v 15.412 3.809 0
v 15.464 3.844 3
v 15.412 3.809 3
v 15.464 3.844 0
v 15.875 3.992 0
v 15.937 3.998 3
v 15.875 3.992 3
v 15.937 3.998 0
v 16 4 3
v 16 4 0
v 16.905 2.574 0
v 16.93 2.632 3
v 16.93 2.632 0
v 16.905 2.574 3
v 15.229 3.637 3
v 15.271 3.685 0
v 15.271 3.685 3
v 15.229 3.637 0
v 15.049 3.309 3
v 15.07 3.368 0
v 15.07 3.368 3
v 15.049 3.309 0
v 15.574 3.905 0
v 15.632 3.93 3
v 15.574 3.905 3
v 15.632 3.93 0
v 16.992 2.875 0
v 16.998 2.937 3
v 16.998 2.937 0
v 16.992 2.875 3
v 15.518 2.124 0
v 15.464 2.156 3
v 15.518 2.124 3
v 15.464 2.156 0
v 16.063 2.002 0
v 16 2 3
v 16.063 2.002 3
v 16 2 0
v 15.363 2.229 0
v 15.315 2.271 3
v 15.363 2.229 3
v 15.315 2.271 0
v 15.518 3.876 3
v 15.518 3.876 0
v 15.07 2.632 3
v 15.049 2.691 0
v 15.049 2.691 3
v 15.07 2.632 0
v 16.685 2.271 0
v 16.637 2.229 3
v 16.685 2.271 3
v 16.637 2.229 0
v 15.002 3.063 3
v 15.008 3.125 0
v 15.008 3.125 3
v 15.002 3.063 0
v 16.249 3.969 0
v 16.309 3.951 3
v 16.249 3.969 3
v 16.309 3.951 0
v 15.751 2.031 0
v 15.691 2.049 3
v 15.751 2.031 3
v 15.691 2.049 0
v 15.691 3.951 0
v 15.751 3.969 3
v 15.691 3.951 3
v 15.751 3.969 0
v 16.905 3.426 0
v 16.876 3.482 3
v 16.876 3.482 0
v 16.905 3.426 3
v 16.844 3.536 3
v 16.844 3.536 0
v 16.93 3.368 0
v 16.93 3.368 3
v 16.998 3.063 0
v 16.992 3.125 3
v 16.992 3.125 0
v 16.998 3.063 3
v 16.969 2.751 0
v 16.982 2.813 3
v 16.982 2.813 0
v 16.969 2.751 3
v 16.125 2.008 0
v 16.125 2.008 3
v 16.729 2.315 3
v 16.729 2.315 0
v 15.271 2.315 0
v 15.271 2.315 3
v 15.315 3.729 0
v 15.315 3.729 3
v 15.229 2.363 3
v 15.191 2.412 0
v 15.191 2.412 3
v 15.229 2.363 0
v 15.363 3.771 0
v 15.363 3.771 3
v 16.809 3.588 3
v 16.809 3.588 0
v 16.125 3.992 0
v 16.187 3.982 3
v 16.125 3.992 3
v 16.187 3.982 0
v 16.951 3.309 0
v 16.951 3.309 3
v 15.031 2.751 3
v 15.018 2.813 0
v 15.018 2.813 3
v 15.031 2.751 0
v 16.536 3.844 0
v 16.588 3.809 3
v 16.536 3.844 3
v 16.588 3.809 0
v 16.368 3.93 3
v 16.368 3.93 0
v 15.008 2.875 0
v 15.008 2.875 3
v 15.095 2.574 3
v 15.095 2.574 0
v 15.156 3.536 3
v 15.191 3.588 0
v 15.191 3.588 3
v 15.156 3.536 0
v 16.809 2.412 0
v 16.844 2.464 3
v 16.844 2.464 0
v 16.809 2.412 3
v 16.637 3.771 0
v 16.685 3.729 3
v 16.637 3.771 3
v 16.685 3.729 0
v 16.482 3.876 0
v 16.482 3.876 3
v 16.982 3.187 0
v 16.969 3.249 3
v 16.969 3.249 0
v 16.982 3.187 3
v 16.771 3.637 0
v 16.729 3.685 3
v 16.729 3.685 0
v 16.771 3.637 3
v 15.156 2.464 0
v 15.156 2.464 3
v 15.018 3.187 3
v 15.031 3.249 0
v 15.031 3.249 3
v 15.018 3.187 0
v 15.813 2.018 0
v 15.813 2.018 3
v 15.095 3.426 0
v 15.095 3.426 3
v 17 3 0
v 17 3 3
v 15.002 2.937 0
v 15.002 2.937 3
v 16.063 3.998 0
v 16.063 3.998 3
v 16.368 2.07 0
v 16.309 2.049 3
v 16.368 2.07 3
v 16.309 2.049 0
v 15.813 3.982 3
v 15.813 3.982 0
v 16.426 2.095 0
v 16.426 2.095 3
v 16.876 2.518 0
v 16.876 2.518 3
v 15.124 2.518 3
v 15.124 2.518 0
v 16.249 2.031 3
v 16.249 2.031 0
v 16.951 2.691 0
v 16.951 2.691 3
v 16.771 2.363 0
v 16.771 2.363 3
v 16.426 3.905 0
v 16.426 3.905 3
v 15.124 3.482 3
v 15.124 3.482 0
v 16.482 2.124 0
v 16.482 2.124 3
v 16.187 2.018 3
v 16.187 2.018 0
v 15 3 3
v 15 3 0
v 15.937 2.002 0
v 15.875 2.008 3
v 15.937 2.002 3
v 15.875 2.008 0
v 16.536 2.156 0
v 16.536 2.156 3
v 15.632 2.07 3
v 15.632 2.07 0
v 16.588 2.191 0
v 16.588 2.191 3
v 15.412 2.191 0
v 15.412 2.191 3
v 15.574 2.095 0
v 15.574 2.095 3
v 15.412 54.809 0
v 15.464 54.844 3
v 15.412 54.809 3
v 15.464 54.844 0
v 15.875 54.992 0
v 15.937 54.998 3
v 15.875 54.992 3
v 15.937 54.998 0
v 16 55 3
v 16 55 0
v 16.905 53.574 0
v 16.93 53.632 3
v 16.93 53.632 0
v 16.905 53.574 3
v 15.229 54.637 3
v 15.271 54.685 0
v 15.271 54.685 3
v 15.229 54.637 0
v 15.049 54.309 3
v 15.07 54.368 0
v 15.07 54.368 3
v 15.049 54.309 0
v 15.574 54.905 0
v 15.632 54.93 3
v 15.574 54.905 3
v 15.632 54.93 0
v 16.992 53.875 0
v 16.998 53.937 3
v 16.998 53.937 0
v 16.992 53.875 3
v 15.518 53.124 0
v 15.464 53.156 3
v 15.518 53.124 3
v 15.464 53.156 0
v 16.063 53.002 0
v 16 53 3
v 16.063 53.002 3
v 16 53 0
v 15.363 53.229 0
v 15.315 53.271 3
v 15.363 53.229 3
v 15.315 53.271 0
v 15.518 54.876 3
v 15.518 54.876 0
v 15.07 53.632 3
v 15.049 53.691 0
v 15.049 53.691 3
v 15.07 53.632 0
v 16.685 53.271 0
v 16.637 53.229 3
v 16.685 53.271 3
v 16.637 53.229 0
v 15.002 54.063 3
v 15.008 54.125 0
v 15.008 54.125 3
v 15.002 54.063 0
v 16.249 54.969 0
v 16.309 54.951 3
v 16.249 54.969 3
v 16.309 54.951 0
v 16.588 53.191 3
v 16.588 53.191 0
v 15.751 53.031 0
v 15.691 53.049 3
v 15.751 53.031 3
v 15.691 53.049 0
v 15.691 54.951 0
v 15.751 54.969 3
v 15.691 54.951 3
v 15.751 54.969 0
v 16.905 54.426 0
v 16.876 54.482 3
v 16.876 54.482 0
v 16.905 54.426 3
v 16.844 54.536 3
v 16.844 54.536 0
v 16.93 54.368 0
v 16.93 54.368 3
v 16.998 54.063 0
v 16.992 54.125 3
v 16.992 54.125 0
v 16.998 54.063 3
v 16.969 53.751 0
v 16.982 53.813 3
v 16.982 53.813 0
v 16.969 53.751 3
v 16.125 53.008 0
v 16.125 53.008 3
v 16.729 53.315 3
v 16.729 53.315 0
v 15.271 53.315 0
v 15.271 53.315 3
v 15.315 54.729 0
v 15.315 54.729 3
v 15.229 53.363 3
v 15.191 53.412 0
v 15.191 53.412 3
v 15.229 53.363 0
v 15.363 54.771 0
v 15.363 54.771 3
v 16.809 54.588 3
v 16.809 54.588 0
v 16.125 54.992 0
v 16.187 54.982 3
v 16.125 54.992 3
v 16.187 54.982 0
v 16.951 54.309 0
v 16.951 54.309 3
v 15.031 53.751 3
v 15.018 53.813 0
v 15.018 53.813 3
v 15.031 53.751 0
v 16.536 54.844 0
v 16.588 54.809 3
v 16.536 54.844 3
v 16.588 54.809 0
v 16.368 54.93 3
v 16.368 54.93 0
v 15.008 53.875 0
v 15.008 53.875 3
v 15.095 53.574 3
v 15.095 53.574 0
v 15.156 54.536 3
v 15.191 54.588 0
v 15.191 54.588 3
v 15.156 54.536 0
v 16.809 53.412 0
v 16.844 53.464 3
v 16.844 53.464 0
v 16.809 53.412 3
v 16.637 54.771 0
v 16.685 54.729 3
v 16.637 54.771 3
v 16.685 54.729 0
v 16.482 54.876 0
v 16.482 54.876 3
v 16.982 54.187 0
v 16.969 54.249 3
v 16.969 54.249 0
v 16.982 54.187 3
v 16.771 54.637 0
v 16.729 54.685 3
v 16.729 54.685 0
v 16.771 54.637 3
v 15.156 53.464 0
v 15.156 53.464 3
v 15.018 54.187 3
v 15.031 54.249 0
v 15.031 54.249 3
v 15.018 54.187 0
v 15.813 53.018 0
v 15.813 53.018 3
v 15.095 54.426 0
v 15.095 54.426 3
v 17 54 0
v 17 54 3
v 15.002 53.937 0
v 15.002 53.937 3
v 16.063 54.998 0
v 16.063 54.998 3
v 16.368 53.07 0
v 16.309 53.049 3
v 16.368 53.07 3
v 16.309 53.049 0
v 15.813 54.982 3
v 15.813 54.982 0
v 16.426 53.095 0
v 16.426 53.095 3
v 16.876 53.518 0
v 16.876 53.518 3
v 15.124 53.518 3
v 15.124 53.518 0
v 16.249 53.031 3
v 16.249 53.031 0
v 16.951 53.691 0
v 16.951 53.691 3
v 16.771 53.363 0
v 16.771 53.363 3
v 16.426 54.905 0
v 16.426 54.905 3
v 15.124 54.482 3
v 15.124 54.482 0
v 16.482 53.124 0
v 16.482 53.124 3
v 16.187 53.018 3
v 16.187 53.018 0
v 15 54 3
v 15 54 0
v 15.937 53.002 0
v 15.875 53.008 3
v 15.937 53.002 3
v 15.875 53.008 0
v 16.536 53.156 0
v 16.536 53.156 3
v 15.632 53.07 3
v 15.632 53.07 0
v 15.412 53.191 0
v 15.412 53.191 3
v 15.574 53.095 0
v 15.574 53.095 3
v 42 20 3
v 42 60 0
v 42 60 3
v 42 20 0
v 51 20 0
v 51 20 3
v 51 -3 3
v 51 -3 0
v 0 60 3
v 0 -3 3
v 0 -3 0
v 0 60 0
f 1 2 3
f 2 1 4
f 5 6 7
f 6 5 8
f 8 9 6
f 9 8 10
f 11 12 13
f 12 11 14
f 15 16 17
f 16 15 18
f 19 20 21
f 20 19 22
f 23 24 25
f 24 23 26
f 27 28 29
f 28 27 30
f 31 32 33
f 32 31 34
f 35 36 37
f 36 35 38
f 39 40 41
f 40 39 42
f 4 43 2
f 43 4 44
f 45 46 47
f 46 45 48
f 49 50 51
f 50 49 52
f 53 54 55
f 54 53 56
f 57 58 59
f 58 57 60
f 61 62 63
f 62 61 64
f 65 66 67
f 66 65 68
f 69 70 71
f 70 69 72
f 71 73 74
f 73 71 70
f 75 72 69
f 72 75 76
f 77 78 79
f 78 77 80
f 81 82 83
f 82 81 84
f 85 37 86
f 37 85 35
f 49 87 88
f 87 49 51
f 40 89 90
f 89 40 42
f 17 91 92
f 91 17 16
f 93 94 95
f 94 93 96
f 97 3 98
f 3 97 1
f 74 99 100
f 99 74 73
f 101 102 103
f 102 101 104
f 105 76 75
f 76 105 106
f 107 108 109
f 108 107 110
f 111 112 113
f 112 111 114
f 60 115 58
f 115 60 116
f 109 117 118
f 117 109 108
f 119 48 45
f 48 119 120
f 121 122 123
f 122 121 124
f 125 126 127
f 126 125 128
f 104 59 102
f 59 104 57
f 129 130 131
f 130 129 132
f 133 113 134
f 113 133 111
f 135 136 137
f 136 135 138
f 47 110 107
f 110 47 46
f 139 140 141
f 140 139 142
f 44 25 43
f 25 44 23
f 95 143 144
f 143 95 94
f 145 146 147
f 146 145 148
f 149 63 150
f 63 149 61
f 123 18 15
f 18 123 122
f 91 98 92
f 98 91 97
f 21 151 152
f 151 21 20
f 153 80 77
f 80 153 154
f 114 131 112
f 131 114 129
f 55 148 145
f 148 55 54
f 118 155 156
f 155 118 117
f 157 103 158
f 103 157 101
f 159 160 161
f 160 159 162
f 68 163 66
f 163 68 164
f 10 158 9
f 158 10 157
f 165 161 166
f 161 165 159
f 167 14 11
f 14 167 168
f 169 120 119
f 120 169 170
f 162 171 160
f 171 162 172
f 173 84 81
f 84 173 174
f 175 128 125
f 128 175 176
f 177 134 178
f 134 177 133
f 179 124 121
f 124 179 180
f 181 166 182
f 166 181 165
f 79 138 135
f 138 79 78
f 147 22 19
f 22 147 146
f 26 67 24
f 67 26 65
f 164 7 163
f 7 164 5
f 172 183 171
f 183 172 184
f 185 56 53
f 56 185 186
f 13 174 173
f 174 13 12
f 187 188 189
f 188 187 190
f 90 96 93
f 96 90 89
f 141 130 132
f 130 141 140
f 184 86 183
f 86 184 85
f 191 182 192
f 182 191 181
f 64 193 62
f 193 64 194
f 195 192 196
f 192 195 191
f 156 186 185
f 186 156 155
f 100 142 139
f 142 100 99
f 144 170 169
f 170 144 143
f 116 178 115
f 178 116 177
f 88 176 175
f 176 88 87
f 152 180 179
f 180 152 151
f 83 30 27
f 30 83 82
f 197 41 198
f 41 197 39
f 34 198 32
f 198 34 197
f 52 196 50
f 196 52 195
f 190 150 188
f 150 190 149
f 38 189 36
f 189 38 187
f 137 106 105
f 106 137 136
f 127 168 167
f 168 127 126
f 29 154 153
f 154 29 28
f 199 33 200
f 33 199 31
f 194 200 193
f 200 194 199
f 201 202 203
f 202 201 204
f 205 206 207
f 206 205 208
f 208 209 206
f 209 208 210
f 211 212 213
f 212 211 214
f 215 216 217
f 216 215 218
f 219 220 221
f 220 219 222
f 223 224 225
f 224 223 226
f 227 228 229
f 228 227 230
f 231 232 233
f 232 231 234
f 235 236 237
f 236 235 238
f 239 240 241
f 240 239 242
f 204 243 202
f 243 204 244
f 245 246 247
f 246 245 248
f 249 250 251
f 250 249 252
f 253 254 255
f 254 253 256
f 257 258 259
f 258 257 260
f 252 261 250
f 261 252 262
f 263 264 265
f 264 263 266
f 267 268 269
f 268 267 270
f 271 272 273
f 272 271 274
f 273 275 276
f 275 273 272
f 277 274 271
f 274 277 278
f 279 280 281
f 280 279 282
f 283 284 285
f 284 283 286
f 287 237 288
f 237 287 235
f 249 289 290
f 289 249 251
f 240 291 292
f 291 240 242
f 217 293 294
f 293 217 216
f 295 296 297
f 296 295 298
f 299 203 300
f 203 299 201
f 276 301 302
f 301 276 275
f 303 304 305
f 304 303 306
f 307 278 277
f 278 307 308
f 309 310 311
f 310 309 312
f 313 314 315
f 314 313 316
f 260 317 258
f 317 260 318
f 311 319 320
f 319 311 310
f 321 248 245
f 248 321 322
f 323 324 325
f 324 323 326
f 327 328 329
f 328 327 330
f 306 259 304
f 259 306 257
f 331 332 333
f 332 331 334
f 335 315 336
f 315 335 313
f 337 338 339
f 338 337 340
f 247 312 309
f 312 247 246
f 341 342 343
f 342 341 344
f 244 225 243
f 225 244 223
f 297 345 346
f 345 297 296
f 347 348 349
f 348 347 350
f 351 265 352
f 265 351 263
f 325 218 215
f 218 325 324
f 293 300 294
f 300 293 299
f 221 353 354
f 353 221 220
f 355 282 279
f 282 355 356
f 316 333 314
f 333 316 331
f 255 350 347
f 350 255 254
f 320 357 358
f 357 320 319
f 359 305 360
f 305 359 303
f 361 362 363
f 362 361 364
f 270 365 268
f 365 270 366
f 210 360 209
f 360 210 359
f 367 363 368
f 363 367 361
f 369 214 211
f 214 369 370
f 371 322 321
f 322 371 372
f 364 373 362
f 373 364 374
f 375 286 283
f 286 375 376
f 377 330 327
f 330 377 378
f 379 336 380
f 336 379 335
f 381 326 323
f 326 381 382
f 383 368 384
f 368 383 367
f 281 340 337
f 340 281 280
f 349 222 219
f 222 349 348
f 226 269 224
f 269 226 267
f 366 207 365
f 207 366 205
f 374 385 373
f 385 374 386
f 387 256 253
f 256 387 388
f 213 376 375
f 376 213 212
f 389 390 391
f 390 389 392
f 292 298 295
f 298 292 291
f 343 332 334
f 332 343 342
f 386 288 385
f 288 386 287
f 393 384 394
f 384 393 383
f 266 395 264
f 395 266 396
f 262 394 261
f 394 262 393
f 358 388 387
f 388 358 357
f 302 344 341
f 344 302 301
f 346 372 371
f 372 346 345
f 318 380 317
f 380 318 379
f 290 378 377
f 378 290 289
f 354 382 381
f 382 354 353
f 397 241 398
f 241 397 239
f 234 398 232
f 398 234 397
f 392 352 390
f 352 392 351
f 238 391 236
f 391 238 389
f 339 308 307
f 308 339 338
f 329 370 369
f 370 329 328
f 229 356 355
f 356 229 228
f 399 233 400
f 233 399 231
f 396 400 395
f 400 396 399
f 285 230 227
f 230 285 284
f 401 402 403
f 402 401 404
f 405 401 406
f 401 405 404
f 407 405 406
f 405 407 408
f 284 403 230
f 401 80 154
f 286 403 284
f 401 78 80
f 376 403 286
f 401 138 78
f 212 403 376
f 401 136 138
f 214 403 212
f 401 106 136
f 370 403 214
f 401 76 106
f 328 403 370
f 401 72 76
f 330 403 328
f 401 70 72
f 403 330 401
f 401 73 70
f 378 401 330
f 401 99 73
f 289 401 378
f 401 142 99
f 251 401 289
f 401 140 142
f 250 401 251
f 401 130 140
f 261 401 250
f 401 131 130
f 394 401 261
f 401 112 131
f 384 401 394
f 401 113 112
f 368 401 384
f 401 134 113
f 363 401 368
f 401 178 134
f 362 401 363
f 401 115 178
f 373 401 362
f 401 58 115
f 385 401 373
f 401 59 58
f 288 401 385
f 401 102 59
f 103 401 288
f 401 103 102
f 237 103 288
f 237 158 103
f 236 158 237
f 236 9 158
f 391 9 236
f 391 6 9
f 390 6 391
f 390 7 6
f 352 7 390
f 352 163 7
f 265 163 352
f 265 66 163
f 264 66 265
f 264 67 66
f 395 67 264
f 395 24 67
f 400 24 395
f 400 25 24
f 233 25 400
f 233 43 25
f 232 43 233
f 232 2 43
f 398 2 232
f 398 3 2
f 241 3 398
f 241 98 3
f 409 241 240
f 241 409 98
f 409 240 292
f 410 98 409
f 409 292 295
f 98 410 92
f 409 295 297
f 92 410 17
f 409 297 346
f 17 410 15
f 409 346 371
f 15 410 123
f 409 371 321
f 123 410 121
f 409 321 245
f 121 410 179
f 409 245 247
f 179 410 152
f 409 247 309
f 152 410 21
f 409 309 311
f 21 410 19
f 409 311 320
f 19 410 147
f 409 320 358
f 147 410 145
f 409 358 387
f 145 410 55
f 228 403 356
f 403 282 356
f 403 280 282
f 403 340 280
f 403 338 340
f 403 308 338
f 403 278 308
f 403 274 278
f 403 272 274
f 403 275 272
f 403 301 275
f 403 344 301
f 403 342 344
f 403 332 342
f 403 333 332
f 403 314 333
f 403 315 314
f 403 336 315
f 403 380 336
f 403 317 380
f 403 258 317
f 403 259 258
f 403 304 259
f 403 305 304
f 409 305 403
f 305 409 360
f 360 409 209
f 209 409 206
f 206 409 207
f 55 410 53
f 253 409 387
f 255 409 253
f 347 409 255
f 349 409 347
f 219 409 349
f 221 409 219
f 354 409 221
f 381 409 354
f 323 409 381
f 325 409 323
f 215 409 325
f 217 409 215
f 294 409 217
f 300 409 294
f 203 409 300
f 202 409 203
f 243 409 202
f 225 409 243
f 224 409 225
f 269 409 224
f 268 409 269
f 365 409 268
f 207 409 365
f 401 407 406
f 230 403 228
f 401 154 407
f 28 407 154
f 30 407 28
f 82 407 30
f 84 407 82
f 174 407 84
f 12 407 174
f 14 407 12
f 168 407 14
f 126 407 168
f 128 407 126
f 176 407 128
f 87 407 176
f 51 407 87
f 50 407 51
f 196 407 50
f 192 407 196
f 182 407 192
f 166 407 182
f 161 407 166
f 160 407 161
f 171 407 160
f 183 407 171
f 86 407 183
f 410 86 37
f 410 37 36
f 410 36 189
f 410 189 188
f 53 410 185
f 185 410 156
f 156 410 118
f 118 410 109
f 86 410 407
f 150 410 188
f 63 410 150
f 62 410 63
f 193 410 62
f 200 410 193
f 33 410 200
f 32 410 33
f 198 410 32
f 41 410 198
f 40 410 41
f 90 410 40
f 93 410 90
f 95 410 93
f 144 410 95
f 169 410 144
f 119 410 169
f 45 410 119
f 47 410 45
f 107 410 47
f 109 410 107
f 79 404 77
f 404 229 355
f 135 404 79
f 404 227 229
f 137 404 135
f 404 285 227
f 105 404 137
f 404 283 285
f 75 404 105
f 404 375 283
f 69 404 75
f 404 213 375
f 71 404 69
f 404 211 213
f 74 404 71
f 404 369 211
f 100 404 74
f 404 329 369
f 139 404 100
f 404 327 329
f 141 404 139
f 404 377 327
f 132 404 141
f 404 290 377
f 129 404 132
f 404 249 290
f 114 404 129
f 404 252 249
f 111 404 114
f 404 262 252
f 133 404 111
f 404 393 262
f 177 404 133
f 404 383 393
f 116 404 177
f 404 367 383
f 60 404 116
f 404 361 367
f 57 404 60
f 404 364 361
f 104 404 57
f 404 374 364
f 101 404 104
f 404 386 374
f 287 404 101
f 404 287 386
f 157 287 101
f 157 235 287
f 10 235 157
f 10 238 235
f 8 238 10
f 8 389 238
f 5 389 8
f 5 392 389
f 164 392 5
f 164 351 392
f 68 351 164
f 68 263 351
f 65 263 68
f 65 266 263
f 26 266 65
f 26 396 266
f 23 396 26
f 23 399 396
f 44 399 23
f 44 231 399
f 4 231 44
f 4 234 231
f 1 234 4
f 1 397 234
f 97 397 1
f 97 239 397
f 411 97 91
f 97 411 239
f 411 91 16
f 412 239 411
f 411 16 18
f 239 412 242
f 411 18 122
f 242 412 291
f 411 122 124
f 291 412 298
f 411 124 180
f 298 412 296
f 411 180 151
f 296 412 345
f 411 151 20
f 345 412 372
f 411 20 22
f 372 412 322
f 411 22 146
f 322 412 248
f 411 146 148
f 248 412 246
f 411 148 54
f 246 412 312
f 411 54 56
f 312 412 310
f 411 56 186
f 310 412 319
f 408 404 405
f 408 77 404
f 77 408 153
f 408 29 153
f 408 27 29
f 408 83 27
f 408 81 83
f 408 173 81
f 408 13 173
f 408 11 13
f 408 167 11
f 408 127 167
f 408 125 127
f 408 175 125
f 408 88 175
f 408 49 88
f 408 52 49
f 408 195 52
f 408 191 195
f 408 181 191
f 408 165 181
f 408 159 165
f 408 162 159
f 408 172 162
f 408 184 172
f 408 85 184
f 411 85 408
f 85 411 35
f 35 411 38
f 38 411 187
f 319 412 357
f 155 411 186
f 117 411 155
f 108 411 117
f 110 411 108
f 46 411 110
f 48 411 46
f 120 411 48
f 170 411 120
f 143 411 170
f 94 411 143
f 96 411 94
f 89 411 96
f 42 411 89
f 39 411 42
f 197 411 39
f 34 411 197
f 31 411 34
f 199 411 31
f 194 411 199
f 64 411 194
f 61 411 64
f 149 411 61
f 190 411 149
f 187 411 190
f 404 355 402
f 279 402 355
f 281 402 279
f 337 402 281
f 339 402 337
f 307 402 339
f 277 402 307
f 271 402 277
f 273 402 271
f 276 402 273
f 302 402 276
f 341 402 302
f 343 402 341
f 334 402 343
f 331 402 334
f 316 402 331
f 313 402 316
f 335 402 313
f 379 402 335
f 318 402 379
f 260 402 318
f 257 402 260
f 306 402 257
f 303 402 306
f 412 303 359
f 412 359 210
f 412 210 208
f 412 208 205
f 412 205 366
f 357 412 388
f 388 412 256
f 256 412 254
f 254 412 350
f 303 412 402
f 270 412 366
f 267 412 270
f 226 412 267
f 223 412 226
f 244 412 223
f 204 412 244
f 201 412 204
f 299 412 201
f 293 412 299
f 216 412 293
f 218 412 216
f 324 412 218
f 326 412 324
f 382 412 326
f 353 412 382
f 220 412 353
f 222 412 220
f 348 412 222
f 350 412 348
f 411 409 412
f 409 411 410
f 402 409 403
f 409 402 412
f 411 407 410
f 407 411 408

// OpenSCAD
difference(){

	union(){
        // onderplaat
        translate([0,-3,0]){
           cube([51,63,3], center=false);
        }
        
	}
	union() {
       // gat in steun rechtsachter
       translate([16,3,0]){
            rotate(a = [0,0,90]) {
                cylinder(h=600, r=1, $fn=100, center=true);
            }
       }			   
       // gat in steun rechtsvoor
       translate([16,54,0]){
            rotate(a = [0,0,90]) {
                cylinder(h=600, r=1, $fn=100, center=true);
            }
       }	
       // uitsparing vloer
        translate([42,20,-10]){
          cube([20,50,20], center=false);
        }      

        
	}
}
